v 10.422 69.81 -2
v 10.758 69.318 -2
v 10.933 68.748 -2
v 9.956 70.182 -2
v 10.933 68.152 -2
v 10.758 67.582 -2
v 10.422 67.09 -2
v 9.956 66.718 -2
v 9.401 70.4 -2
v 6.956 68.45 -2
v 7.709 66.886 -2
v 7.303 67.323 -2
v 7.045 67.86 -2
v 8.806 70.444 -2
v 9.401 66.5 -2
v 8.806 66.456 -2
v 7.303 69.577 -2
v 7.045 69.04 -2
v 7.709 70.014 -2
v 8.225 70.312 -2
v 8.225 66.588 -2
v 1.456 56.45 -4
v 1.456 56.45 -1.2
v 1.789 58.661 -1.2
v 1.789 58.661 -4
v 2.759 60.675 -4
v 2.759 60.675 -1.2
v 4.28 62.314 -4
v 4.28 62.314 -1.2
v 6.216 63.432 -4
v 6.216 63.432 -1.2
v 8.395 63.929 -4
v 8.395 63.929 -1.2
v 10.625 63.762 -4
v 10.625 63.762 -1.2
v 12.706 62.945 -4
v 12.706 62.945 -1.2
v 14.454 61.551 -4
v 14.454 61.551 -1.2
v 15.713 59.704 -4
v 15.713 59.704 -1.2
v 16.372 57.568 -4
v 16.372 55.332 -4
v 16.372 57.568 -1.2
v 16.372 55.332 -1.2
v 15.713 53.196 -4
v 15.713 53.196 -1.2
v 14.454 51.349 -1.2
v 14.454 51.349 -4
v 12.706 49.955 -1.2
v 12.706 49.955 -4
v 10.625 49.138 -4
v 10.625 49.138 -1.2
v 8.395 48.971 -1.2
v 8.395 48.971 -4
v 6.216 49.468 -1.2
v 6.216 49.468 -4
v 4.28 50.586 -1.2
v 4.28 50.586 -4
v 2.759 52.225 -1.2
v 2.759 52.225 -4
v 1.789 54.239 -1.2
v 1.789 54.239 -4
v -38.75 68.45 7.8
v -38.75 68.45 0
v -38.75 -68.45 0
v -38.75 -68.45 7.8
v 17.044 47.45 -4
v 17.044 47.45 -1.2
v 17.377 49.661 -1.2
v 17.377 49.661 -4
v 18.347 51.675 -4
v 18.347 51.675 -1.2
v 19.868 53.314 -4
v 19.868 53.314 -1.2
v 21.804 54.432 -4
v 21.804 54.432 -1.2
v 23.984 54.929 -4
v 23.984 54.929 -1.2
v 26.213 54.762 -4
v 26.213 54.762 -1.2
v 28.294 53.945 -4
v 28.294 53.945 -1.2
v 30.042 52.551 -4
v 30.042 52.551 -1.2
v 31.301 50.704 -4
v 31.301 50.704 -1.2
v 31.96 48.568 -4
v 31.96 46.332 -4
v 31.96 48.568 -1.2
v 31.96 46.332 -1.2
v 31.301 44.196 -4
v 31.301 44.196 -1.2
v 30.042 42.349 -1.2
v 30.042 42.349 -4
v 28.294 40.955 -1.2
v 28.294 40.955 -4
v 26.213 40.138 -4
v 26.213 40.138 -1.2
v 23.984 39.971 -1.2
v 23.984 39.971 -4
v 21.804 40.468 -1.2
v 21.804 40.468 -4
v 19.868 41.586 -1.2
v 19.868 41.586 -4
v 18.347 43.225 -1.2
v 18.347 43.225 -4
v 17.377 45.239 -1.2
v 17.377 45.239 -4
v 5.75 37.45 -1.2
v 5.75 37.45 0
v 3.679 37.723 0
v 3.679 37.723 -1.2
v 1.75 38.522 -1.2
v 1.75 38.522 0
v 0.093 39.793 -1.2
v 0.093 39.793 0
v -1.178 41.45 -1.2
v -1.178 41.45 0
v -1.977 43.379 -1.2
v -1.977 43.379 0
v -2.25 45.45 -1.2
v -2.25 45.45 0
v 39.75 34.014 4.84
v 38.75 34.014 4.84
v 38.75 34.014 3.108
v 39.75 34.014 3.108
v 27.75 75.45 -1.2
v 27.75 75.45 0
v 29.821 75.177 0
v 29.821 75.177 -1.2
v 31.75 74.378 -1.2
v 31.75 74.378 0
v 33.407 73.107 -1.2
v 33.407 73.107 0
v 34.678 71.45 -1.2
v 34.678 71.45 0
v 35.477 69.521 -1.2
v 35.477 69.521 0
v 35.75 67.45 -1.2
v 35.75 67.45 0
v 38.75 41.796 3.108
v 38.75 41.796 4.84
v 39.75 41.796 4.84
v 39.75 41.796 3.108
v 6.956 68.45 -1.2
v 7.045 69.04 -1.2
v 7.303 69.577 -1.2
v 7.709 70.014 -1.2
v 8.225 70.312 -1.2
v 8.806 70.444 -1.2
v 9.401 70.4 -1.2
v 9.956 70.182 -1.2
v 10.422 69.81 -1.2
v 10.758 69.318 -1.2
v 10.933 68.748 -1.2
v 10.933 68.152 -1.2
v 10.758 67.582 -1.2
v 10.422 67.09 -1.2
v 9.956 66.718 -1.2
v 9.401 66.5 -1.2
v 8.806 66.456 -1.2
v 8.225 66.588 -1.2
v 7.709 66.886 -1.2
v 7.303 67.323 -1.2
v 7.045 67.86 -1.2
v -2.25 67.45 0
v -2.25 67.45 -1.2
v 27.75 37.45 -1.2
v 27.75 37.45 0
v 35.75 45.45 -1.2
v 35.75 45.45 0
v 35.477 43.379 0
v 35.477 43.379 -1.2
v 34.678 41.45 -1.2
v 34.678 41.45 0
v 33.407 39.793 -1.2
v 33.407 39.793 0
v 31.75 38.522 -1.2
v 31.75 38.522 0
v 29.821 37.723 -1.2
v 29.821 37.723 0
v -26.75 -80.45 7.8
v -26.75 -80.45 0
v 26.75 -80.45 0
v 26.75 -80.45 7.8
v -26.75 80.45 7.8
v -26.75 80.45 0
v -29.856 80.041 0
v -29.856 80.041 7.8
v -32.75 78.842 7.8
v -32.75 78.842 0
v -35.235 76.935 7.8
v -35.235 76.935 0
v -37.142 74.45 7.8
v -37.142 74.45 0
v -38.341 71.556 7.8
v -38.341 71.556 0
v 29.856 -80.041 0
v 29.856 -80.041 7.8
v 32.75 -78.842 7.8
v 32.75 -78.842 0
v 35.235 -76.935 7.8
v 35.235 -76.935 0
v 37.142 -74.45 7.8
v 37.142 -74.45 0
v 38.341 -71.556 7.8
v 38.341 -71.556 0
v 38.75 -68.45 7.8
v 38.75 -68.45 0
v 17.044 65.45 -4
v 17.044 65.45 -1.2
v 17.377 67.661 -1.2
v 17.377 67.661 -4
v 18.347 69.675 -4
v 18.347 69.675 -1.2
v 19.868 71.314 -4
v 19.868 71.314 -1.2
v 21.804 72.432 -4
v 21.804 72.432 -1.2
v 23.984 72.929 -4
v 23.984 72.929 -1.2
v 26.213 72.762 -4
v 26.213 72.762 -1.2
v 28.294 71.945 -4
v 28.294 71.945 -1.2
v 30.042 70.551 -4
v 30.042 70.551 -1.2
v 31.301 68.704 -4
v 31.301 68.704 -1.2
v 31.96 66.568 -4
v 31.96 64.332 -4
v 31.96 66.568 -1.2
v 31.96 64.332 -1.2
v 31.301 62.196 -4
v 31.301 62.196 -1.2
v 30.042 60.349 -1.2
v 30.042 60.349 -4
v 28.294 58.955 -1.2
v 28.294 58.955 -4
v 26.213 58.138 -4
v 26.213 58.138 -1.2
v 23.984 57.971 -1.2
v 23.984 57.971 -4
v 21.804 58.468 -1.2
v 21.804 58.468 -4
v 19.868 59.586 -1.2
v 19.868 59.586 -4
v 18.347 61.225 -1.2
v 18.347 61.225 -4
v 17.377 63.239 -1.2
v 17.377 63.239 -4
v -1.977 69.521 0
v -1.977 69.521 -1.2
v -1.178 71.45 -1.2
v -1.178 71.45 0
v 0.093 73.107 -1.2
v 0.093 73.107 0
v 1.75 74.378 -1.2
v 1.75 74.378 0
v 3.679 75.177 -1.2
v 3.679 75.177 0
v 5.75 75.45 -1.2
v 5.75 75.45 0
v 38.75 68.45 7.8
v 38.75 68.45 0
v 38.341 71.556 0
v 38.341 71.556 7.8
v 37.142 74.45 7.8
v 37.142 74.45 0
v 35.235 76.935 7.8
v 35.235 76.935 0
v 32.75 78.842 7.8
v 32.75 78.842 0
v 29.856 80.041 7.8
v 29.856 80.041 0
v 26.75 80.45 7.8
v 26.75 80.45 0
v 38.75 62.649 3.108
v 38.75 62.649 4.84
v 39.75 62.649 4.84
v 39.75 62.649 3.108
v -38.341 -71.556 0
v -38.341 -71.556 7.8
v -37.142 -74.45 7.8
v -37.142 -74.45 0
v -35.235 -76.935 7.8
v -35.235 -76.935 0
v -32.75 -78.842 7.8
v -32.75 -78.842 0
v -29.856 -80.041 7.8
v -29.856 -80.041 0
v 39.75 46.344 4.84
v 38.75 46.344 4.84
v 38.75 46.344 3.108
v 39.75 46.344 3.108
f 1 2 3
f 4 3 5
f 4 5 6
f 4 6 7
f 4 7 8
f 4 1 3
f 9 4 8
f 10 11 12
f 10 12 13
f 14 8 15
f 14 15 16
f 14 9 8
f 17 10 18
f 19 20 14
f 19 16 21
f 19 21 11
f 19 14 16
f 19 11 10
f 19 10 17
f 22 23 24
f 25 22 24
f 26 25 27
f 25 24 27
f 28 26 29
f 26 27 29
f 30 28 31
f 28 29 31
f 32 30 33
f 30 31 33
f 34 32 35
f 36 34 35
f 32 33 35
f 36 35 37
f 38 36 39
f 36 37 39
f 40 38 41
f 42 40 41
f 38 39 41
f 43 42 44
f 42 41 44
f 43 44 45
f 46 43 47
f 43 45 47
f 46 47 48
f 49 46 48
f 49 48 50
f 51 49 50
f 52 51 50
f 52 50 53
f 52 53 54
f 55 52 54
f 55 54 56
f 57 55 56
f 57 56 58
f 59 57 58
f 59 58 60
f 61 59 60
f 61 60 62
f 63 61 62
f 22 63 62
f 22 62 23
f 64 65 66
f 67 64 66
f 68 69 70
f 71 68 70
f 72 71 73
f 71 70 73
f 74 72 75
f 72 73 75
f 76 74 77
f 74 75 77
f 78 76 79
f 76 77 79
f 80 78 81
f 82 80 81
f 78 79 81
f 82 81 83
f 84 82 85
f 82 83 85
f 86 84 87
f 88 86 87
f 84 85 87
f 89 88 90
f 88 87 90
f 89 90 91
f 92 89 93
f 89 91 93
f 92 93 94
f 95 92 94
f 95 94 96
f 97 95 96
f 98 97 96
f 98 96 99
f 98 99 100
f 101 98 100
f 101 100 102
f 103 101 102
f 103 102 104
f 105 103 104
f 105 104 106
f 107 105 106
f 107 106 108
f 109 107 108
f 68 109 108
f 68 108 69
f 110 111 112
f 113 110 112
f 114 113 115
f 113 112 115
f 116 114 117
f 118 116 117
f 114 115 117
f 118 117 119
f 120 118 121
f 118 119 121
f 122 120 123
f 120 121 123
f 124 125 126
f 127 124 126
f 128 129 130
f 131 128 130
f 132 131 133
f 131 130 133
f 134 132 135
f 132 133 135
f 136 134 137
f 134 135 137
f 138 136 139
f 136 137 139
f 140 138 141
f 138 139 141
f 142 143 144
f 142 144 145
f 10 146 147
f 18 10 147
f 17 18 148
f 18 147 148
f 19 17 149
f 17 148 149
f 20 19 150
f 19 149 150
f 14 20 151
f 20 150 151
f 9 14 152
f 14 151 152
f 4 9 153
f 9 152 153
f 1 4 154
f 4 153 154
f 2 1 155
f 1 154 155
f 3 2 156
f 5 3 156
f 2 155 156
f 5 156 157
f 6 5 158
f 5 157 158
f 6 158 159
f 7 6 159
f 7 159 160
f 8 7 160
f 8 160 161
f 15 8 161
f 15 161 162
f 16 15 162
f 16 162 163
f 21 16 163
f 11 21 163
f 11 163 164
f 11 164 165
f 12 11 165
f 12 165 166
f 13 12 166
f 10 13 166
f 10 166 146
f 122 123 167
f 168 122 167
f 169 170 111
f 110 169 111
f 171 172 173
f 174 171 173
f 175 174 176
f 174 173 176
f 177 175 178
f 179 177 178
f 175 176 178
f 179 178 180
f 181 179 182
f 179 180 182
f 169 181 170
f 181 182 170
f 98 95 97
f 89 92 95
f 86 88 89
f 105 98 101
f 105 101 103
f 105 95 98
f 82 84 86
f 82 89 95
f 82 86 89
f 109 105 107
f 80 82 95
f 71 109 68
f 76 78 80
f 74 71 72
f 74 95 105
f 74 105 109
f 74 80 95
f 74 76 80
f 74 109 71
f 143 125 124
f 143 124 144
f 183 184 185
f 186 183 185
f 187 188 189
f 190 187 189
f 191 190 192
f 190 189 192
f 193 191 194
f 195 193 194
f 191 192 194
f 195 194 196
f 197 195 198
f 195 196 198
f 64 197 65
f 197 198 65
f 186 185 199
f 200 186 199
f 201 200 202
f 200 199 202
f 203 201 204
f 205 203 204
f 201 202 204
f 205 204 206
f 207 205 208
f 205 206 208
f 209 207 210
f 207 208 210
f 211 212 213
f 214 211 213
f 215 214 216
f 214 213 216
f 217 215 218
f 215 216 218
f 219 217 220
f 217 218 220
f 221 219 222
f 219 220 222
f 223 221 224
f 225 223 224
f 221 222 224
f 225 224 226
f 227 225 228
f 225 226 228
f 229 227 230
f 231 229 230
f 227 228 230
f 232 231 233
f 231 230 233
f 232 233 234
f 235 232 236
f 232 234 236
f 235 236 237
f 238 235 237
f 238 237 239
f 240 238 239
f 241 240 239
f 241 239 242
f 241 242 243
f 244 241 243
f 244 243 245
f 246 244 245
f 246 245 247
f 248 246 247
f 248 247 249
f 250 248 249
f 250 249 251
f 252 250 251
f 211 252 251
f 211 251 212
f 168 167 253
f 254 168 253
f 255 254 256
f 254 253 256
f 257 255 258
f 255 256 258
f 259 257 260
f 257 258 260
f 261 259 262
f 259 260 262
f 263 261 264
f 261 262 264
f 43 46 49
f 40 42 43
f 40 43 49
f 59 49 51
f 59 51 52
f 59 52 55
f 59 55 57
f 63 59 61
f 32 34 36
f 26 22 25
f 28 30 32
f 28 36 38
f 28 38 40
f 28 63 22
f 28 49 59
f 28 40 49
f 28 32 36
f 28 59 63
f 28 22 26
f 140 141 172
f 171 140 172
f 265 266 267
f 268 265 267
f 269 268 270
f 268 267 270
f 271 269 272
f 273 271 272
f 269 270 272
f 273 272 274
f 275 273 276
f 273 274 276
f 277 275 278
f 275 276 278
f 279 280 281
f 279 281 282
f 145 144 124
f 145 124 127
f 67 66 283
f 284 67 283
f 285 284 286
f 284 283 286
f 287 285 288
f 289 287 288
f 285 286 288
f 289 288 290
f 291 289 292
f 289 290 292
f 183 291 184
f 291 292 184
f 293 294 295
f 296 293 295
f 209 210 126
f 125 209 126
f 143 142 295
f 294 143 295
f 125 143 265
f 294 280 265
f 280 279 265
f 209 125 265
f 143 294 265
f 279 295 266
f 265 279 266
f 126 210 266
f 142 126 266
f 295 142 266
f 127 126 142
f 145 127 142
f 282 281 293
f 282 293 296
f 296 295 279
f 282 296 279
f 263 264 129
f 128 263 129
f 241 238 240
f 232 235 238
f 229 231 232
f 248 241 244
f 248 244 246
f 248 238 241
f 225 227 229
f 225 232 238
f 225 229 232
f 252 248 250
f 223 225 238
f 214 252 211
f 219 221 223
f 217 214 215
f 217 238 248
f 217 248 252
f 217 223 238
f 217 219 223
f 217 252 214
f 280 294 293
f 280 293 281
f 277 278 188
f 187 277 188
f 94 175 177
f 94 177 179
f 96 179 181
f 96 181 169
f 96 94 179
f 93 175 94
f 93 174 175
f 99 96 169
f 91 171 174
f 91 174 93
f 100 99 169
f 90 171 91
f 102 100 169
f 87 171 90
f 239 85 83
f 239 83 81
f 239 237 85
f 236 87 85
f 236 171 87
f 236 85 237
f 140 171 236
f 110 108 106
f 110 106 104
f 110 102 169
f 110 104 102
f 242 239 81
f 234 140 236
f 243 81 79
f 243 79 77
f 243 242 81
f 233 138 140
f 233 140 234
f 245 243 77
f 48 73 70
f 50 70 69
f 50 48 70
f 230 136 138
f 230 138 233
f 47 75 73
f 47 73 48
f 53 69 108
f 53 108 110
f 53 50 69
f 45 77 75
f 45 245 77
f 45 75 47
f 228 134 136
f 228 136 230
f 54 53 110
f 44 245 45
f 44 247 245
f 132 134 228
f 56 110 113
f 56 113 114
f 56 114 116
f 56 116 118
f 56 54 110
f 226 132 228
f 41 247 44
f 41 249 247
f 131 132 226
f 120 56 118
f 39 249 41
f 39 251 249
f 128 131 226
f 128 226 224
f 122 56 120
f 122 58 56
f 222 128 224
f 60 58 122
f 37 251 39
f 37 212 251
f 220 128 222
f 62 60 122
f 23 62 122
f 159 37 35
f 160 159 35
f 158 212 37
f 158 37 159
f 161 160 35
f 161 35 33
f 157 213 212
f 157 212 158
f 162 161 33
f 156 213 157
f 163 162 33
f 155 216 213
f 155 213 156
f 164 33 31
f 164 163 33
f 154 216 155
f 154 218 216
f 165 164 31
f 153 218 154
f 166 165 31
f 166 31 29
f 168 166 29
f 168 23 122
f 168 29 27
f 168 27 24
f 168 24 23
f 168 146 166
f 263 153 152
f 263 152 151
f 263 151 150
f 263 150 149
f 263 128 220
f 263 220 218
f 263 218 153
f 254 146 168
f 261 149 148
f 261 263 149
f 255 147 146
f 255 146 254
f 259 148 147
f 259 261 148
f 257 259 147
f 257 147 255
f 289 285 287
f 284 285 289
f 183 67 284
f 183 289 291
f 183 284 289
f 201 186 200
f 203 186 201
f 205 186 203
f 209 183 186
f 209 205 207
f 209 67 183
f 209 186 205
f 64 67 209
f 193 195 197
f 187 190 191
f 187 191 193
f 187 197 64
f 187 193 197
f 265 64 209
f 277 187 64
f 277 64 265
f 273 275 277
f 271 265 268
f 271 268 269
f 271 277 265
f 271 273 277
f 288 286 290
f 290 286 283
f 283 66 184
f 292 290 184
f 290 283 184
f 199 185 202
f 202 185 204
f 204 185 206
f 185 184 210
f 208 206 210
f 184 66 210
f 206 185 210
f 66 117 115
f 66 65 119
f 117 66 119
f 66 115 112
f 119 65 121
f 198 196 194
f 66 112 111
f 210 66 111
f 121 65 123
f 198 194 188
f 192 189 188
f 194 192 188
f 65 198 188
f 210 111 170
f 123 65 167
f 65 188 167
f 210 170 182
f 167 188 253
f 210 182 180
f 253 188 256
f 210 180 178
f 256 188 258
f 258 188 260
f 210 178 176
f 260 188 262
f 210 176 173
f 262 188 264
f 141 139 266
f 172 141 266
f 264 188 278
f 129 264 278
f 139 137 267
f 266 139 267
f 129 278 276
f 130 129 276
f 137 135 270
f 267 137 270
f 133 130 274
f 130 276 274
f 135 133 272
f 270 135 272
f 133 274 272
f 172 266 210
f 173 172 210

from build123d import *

# Parameters (mm, degrees)
EXTRUDE_1_DEPTH = 7.8
EXTRUDE_2_DEPTH = 1.2
SKETCH_15_4_R   = 7.5
EXTRUDE_3_DEPTH = 4
SKETCH_15_6_R   = 2
EXTRUDE_5_DEPTH = 2
SKETCH_19_W     = 1.732399473
SKETCH_19_H     = 16.304936216
SKETCH_19_H_2   = 7.781530809
EXTRUDE_6_DEPTH = 1
SKETCH_20_W     = 5.132835337
SKETCH_20_H     = 16.681714846
EXTRUDE_8_DEPTH = 1


with BuildPart() as part:
    # 草图1 → 凸台-拉伸1 (new body)
    with BuildSketch(Plane.XY):
        with BuildLine():
            Line((-26.75, -80.45), (26.75, -80.45))
            ThreePointArc((26.75, -80.45), (35.235281374, -76.935281374), (38.75, -68.45))
            Line((38.75, -68.45), (38.75, 68.45))
            ThreePointArc((38.75, 68.45), (35.235281374, 76.935281374), (26.75, 80.45))
            Line((26.75, 80.45), (-26.75, 80.45))
            ThreePointArc((-26.75, 80.45), (-35.235281374, 76.935281374), (-38.75, 68.45))
            Line((-38.75, 68.45), (-38.75, -68.45))
            ThreePointArc((-38.75, -68.45), (-35.235281374, -76.935281374), (-26.75, -80.45))
        make_face()
    extrude(amount=EXTRUDE_1_DEPTH)

    # 草图15 → 凸台-拉伸2 (add)
    with BuildSketch(Plane(origin=(0, 0, 0), x_dir=(-1, 0, 0), z_dir=(0, 0, -1))):
        with BuildLine():
            Line((-27.75, 37.45), (-5.75, 37.45))
            ThreePointArc((-5.75, 37.45), (-0.093145751, 39.793145751), (2.25, 45.45))
            Line((2.25, 45.45), (2.25, 67.45))
            ThreePointArc((2.25, 67.45), (-0.093145751, 73.106854249), (-5.75, 75.45))
            Line((-5.75, 75.45), (-27.75, 75.45))
            ThreePointArc((-27.75, 75.45), (-33.406854249, 73.106854249), (-35.75, 67.45))
            Line((-35.75, 67.45), (-35.75, 45.45))
            ThreePointArc((-35.75, 45.45), (-33.406854249, 39.793145751), (-27.75, 37.45))
        make_face()
    extrude(amount=EXTRUDE_2_DEPTH)

    # 草图15<4> → 凸台-拉伸3 (add)
    with BuildSketch(Plane(origin=(0, 0, 0), x_dir=(-1, 0, 0), z_dir=(0, 0, -1))):
        with Locations((-24.544228634, 65.45)):
            Circle(SKETCH_15_4_R)
        with Locations((-8.955771366, 56.45)):
            Circle(SKETCH_15_4_R)
        with Locations((-24.544228634, 47.45)):
            Circle(SKETCH_15_4_R)
    extrude(amount=EXTRUDE_3_DEPTH)

    # 草图15<6> → 凸台-拉伸5 (add)
    with BuildSketch(Plane(origin=(0, 0, 0), x_dir=(-1, 0, 0), z_dir=(0, 0, -1))):
        with Locations((-8.955771366, 68.45)):
            Circle(SKETCH_15_6_R)
    extrude(amount=EXTRUDE_5_DEPTH)

    # 草图19 → 凸台-拉伸6 (add)
    with BuildSketch(Plane(origin=(38.75, 0, 0), x_dir=(0, 0, -1), z_dir=(1, 0, 0))):
        with Locations((-3.974017222, 54.496659623)):
            Rectangle(SKETCH_19_W, SKETCH_19_H)
        with Locations((-3.974017222, 37.905227845)):
            Rectangle(SKETCH_19_W, SKETCH_19_H_2)
    extrude(amount=EXTRUDE_6_DEPTH)

    # 草图20 → 凸台-拉伸8 (add)
    with BuildSketch(Plane(origin=(38.75, 0, 0), x_dir=(0, 0, -1), z_dir=(1, 0, 0))):
        with Locations((-4.262343754, -17.460613504)):
            Rectangle(SKETCH_20_W, SKETCH_20_H)
    extrude(amount=-EXTRUDE_8_DEPTH)


solid = part.part
